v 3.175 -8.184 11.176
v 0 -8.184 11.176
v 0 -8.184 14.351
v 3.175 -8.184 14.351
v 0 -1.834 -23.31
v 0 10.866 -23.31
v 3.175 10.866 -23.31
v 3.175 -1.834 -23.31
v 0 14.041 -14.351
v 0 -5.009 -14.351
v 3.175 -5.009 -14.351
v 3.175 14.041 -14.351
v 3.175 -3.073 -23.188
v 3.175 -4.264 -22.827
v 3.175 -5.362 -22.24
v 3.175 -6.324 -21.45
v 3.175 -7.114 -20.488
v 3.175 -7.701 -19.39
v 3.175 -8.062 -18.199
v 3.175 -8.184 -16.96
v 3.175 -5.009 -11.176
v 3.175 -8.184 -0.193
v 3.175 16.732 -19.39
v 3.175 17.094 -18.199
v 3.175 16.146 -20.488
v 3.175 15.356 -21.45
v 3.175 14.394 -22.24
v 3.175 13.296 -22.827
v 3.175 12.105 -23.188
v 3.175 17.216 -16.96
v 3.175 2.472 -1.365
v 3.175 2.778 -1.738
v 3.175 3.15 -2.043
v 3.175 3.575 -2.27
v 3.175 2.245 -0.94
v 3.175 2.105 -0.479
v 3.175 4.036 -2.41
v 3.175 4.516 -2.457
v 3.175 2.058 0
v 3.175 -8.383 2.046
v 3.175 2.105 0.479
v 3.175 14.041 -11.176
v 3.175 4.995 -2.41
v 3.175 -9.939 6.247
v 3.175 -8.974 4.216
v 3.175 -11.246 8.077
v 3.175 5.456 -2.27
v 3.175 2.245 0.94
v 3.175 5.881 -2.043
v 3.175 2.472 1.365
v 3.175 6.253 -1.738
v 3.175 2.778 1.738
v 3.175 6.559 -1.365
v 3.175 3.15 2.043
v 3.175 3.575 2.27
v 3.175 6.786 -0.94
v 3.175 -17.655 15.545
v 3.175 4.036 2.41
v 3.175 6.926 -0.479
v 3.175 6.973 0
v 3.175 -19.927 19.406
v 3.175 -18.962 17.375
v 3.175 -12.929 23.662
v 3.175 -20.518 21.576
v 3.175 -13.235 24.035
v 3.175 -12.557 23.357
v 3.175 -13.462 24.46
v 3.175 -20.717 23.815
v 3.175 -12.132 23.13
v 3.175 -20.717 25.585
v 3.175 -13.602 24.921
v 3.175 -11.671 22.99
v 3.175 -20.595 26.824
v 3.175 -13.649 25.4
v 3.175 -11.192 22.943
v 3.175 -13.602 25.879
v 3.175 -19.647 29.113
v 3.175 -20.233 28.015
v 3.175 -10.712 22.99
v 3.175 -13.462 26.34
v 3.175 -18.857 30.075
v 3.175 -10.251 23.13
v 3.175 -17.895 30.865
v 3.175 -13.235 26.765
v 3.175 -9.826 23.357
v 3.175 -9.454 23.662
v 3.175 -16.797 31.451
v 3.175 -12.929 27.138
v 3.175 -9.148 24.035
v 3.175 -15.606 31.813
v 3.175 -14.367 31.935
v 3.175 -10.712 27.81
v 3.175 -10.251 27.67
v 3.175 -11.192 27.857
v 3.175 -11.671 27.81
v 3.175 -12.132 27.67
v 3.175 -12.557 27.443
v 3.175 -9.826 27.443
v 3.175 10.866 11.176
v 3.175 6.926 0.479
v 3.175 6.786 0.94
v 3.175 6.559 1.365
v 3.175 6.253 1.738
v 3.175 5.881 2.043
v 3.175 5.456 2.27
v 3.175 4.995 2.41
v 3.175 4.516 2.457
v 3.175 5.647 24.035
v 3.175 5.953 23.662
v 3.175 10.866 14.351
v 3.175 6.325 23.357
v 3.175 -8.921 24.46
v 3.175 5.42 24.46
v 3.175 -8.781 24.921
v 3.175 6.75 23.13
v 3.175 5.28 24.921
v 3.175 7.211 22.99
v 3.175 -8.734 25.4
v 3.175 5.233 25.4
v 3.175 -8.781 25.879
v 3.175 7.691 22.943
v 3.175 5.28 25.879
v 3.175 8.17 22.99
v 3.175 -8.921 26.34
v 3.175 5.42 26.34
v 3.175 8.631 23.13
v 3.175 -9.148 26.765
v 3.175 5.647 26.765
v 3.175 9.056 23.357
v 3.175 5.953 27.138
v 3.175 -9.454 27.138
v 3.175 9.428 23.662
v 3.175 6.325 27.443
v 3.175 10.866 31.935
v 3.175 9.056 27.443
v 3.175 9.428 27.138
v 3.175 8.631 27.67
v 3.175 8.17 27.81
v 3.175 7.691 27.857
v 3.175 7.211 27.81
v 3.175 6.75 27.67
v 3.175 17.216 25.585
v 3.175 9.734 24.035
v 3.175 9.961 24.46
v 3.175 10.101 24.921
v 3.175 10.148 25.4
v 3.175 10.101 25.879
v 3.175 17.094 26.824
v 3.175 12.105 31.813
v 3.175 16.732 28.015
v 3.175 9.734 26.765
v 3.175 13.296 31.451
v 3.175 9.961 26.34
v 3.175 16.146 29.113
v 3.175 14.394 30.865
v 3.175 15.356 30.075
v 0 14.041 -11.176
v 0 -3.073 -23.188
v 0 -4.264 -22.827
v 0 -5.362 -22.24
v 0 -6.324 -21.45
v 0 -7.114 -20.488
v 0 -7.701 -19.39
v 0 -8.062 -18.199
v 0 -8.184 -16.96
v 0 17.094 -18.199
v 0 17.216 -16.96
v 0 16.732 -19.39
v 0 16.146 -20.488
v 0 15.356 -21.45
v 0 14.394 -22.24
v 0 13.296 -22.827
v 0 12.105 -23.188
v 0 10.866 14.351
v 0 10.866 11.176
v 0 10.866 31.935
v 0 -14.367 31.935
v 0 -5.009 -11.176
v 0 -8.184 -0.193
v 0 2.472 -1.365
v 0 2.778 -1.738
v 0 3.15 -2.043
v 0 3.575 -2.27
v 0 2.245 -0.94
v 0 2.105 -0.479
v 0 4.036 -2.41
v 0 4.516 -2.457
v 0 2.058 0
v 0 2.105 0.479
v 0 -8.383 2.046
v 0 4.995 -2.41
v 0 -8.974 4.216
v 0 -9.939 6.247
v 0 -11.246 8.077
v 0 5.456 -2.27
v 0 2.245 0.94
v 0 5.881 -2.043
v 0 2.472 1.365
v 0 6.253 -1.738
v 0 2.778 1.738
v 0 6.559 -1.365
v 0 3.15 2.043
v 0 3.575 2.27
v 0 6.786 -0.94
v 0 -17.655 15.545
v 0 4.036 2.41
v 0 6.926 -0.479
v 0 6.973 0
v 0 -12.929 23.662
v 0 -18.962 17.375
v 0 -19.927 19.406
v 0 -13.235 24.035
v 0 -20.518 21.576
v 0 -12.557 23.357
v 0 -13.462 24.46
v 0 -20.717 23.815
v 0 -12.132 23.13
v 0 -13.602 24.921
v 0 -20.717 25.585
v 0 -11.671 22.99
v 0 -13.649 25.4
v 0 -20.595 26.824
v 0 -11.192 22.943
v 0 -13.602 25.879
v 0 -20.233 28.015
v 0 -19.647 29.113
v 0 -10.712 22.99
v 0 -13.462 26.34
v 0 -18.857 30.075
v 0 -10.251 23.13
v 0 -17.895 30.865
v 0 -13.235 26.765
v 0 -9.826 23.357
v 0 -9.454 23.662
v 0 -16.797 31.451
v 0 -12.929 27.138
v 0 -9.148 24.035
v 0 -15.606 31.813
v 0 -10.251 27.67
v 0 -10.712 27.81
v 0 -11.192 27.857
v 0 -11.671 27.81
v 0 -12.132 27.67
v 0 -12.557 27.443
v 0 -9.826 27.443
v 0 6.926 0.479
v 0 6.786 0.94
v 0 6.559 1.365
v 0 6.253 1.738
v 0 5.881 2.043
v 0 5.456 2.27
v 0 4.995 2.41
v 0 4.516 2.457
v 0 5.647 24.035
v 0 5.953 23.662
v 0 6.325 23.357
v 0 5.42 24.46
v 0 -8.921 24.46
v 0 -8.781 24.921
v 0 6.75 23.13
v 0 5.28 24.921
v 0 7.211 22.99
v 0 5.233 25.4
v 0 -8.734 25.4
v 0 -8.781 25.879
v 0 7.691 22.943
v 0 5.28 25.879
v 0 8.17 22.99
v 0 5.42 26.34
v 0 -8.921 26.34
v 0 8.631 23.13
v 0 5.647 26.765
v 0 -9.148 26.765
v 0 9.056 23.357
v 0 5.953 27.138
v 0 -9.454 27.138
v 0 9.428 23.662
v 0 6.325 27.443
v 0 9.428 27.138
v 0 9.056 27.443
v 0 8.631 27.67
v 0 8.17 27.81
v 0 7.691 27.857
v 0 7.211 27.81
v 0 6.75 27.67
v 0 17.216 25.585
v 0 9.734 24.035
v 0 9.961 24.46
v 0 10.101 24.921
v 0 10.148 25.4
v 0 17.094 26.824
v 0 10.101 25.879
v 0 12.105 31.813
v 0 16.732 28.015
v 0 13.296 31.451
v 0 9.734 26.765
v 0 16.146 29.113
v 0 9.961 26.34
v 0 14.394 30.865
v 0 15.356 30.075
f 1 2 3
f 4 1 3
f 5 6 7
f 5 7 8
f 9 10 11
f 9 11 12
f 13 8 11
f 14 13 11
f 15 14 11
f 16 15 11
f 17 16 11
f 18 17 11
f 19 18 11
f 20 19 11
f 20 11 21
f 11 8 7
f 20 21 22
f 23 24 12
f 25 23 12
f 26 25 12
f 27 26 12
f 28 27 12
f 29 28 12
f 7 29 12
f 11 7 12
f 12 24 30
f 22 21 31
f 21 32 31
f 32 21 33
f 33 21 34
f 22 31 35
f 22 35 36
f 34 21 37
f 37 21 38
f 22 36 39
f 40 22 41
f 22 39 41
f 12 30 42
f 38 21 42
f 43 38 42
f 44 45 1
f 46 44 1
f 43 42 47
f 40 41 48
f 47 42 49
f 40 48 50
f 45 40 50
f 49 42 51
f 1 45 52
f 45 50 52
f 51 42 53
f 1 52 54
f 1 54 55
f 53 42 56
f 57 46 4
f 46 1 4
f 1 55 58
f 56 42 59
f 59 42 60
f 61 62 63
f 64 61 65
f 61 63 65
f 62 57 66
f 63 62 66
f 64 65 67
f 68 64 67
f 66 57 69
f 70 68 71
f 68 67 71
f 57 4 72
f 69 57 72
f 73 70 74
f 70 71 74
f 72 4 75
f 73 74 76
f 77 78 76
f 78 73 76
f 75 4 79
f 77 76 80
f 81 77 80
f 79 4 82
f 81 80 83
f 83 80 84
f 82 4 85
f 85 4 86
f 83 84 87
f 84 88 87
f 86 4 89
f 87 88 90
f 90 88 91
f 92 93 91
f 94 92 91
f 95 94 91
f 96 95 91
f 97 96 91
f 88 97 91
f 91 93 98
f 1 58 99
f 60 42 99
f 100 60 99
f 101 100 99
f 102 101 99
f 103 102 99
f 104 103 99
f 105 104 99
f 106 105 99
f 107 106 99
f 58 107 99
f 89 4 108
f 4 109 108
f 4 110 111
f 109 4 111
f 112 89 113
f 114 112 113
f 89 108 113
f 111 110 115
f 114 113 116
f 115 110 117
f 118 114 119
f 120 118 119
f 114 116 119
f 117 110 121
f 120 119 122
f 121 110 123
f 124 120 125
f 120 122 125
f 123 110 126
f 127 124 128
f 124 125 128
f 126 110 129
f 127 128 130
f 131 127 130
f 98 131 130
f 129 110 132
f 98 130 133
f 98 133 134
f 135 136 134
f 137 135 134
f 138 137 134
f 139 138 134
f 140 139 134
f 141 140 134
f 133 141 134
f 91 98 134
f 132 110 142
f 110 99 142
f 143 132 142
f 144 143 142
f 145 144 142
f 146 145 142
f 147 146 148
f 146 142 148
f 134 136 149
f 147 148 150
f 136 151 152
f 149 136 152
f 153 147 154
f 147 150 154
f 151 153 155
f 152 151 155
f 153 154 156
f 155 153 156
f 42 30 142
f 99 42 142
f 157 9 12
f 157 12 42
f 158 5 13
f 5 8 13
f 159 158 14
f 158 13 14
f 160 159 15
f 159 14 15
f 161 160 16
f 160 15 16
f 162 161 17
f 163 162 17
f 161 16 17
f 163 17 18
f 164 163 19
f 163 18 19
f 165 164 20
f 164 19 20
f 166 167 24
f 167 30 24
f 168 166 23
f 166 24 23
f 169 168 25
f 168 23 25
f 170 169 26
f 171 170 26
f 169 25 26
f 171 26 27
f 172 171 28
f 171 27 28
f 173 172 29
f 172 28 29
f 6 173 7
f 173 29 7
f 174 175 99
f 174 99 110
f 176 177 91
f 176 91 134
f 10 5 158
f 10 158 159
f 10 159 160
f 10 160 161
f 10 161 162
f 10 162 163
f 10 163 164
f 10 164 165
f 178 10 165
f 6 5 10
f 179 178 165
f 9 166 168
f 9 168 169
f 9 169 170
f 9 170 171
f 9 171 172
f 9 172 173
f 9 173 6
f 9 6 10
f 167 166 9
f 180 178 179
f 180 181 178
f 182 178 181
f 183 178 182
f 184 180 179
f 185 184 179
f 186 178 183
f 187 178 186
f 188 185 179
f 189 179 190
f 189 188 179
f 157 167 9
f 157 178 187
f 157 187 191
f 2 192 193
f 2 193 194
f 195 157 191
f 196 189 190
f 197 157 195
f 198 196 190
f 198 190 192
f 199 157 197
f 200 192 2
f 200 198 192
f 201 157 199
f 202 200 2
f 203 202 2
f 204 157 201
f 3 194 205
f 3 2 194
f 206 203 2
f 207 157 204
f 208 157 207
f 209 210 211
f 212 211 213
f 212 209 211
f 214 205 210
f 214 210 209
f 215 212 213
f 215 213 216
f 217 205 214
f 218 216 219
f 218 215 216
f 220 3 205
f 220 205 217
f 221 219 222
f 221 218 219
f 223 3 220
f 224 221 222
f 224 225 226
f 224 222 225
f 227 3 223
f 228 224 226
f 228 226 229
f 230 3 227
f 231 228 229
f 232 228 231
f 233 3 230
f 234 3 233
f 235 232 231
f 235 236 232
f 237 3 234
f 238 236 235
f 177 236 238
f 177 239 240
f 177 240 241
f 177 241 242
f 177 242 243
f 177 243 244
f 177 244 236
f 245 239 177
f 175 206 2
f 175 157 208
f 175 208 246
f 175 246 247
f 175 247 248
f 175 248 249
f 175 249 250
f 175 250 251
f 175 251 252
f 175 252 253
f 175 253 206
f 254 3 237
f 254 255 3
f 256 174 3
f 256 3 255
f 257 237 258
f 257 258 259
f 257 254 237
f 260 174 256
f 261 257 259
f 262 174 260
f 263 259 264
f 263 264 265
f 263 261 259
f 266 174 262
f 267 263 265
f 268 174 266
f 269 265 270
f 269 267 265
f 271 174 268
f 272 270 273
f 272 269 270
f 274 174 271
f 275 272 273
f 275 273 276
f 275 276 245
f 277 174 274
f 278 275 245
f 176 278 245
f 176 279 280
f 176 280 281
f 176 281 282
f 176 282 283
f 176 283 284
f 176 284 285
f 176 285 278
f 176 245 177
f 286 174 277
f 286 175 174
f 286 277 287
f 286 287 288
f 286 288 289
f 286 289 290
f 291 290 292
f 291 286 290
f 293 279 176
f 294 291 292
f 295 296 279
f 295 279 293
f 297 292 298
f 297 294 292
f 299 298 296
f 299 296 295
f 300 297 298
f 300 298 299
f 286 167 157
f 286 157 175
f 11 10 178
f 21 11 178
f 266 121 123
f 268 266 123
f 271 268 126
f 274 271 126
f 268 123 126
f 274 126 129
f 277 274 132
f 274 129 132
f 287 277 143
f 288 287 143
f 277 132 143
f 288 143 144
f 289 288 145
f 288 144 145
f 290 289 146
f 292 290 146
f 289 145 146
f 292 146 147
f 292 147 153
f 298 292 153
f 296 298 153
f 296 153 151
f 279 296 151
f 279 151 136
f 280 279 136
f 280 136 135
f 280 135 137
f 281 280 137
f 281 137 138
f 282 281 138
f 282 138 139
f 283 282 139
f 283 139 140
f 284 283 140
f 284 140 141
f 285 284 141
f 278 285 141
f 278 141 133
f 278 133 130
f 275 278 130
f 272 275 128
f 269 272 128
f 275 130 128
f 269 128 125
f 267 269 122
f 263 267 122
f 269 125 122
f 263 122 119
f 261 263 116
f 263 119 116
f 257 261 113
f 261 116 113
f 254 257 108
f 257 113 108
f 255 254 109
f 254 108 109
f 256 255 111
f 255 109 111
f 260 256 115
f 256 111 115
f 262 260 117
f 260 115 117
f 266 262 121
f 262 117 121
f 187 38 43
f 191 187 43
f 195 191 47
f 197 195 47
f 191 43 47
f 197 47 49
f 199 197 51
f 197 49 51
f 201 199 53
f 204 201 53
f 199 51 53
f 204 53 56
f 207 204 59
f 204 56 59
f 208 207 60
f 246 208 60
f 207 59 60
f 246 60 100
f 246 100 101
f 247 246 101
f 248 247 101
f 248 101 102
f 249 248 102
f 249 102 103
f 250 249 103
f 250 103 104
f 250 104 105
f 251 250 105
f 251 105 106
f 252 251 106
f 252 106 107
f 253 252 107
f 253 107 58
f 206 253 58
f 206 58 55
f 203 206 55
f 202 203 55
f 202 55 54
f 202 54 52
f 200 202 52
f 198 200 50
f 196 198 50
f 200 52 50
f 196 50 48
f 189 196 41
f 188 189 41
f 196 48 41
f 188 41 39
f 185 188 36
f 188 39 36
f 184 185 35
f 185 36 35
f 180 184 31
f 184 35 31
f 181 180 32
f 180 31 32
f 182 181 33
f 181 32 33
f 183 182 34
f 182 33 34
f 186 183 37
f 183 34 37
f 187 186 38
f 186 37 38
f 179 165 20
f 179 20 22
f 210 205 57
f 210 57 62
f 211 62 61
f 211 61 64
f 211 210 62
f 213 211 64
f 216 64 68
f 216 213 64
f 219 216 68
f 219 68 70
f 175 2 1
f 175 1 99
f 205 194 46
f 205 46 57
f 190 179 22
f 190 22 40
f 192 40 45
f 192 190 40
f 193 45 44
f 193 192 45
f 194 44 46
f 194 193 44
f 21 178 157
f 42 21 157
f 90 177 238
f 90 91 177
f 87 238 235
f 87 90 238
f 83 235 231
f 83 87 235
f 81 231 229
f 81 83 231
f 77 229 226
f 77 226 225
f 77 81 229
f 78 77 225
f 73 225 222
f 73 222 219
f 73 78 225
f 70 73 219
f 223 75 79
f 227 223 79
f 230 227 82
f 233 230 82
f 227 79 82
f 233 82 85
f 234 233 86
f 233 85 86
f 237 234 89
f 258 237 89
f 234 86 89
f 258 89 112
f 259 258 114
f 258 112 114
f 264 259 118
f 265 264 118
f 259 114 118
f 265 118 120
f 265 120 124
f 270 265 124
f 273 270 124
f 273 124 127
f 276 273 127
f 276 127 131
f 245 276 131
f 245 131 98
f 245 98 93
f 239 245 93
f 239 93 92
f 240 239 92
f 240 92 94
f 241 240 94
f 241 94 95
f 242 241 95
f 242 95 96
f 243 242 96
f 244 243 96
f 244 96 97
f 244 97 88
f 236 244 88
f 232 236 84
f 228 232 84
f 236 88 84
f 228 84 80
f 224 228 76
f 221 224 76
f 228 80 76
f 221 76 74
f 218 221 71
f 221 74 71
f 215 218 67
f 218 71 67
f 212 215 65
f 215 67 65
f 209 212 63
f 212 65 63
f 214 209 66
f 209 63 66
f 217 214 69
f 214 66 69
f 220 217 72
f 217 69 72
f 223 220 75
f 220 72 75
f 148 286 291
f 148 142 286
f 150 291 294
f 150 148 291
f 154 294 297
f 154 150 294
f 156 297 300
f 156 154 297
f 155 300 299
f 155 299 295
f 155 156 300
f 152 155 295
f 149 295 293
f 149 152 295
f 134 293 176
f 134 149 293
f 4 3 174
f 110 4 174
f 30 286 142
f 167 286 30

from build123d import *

# Parameters (mm, degrees)
BOSS_EXTRUDE1_DEPTH              = 3.175
SKETCH7_W                        = 3.175
SKETCH7_H                        = 19.05
CUT_EXTRUDE1_DEPTH               = 3.175
F_10_0_1935_DIAMETER_HOLE1_D     = 4.9149
F_10_0_1935_DIAMETER_HOLE1_DEPTH = 9.699415072
F_10_0_1935_DIAMETER_HOLE1_TIP   = 1.476584928
FILLET1_R                        = 6.35


with BuildPart() as part:
    # Sketch1 → Boss-Extrude1 (new body)
    with BuildSketch(Plane(origin=(0, 0, 0), x_dir=(0, 0, -1), z_dir=(1, 0, 0))):
        with BuildLine():
            Line((-31.934860292, 17.215678835), (23.310139708, 17.215678835))
            Line((23.310139708, 17.215678835), (23.310139708, -8.184321165))
            Line((23.310139708, -8.184321165), (0.193463217, -8.184321165))
            ThreePointArc((0.193463217, -8.184321165), (-4.215993747, -8.974380389), (-8.076831475, -11.24625986))
            Line((-8.076831475, -11.24625986), (-15.545168525, -17.65474247))
            ThreePointArc((-15.545168525, -17.65474247), (-19.406006253, -19.926621941), (-23.815463217, -20.716681165))
            Line((-23.815463217, -20.716681165), (-31.934860292, -20.716681165))
            Line((-31.934860292, -20.716681165), (-31.934860292, 17.215678835))
        make_face()
    extrude(amount=BOSS_EXTRUDE1_DEPTH)

    # Sketch7 → Cut-Extrude1 (cut)
    with BuildSketch(Plane.ZY):
        with Locations((-12.7635, 4.515678835)):
            Rectangle(SKETCH7_W, SKETCH7_H)
        with Locations((12.7635, 1.340678835)):
            Rectangle(SKETCH7_W, SKETCH7_H)
    extrude(amount=-CUT_EXTRUDE1_DEPTH, mode=Mode.SUBTRACT)

    # #10 (0.1935) Diameter Hole1
    with Locations(Plane.ZY):
        with Locations((25.4, 7.690678835), (25.4, -11.191681165), (0, 4.515678835)):
            Hole(F_10_0_1935_DIAMETER_HOLE1_D / 2, depth=F_10_0_1935_DIAMETER_HOLE1_DEPTH)
            with Locations((0, 0, -(F_10_0_1935_DIAMETER_HOLE1_DEPTH + F_10_0_1935_DIAMETER_HOLE1_TIP / 2))):  # 118° drill point
                Cone(0, F_10_0_1935_DIAMETER_HOLE1_D / 2, F_10_0_1935_DIAMETER_HOLE1_TIP, mode=Mode.SUBTRACT)

    # Fillet1
    fillet1_edges = [part.edges().sort_by_distance(p)[0] for p in [
        (1.5875, 17.215678835, 31.934860292),
        (1.5875, 17.215678835, -23.310139708),
        (1.5875, -8.184321165, -23.310139708),
        (1.5875, -20.716681165, 31.934860292),
    ]]
    fillet(fillet1_edges, radius=FILLET1_R)


solid = part.part
